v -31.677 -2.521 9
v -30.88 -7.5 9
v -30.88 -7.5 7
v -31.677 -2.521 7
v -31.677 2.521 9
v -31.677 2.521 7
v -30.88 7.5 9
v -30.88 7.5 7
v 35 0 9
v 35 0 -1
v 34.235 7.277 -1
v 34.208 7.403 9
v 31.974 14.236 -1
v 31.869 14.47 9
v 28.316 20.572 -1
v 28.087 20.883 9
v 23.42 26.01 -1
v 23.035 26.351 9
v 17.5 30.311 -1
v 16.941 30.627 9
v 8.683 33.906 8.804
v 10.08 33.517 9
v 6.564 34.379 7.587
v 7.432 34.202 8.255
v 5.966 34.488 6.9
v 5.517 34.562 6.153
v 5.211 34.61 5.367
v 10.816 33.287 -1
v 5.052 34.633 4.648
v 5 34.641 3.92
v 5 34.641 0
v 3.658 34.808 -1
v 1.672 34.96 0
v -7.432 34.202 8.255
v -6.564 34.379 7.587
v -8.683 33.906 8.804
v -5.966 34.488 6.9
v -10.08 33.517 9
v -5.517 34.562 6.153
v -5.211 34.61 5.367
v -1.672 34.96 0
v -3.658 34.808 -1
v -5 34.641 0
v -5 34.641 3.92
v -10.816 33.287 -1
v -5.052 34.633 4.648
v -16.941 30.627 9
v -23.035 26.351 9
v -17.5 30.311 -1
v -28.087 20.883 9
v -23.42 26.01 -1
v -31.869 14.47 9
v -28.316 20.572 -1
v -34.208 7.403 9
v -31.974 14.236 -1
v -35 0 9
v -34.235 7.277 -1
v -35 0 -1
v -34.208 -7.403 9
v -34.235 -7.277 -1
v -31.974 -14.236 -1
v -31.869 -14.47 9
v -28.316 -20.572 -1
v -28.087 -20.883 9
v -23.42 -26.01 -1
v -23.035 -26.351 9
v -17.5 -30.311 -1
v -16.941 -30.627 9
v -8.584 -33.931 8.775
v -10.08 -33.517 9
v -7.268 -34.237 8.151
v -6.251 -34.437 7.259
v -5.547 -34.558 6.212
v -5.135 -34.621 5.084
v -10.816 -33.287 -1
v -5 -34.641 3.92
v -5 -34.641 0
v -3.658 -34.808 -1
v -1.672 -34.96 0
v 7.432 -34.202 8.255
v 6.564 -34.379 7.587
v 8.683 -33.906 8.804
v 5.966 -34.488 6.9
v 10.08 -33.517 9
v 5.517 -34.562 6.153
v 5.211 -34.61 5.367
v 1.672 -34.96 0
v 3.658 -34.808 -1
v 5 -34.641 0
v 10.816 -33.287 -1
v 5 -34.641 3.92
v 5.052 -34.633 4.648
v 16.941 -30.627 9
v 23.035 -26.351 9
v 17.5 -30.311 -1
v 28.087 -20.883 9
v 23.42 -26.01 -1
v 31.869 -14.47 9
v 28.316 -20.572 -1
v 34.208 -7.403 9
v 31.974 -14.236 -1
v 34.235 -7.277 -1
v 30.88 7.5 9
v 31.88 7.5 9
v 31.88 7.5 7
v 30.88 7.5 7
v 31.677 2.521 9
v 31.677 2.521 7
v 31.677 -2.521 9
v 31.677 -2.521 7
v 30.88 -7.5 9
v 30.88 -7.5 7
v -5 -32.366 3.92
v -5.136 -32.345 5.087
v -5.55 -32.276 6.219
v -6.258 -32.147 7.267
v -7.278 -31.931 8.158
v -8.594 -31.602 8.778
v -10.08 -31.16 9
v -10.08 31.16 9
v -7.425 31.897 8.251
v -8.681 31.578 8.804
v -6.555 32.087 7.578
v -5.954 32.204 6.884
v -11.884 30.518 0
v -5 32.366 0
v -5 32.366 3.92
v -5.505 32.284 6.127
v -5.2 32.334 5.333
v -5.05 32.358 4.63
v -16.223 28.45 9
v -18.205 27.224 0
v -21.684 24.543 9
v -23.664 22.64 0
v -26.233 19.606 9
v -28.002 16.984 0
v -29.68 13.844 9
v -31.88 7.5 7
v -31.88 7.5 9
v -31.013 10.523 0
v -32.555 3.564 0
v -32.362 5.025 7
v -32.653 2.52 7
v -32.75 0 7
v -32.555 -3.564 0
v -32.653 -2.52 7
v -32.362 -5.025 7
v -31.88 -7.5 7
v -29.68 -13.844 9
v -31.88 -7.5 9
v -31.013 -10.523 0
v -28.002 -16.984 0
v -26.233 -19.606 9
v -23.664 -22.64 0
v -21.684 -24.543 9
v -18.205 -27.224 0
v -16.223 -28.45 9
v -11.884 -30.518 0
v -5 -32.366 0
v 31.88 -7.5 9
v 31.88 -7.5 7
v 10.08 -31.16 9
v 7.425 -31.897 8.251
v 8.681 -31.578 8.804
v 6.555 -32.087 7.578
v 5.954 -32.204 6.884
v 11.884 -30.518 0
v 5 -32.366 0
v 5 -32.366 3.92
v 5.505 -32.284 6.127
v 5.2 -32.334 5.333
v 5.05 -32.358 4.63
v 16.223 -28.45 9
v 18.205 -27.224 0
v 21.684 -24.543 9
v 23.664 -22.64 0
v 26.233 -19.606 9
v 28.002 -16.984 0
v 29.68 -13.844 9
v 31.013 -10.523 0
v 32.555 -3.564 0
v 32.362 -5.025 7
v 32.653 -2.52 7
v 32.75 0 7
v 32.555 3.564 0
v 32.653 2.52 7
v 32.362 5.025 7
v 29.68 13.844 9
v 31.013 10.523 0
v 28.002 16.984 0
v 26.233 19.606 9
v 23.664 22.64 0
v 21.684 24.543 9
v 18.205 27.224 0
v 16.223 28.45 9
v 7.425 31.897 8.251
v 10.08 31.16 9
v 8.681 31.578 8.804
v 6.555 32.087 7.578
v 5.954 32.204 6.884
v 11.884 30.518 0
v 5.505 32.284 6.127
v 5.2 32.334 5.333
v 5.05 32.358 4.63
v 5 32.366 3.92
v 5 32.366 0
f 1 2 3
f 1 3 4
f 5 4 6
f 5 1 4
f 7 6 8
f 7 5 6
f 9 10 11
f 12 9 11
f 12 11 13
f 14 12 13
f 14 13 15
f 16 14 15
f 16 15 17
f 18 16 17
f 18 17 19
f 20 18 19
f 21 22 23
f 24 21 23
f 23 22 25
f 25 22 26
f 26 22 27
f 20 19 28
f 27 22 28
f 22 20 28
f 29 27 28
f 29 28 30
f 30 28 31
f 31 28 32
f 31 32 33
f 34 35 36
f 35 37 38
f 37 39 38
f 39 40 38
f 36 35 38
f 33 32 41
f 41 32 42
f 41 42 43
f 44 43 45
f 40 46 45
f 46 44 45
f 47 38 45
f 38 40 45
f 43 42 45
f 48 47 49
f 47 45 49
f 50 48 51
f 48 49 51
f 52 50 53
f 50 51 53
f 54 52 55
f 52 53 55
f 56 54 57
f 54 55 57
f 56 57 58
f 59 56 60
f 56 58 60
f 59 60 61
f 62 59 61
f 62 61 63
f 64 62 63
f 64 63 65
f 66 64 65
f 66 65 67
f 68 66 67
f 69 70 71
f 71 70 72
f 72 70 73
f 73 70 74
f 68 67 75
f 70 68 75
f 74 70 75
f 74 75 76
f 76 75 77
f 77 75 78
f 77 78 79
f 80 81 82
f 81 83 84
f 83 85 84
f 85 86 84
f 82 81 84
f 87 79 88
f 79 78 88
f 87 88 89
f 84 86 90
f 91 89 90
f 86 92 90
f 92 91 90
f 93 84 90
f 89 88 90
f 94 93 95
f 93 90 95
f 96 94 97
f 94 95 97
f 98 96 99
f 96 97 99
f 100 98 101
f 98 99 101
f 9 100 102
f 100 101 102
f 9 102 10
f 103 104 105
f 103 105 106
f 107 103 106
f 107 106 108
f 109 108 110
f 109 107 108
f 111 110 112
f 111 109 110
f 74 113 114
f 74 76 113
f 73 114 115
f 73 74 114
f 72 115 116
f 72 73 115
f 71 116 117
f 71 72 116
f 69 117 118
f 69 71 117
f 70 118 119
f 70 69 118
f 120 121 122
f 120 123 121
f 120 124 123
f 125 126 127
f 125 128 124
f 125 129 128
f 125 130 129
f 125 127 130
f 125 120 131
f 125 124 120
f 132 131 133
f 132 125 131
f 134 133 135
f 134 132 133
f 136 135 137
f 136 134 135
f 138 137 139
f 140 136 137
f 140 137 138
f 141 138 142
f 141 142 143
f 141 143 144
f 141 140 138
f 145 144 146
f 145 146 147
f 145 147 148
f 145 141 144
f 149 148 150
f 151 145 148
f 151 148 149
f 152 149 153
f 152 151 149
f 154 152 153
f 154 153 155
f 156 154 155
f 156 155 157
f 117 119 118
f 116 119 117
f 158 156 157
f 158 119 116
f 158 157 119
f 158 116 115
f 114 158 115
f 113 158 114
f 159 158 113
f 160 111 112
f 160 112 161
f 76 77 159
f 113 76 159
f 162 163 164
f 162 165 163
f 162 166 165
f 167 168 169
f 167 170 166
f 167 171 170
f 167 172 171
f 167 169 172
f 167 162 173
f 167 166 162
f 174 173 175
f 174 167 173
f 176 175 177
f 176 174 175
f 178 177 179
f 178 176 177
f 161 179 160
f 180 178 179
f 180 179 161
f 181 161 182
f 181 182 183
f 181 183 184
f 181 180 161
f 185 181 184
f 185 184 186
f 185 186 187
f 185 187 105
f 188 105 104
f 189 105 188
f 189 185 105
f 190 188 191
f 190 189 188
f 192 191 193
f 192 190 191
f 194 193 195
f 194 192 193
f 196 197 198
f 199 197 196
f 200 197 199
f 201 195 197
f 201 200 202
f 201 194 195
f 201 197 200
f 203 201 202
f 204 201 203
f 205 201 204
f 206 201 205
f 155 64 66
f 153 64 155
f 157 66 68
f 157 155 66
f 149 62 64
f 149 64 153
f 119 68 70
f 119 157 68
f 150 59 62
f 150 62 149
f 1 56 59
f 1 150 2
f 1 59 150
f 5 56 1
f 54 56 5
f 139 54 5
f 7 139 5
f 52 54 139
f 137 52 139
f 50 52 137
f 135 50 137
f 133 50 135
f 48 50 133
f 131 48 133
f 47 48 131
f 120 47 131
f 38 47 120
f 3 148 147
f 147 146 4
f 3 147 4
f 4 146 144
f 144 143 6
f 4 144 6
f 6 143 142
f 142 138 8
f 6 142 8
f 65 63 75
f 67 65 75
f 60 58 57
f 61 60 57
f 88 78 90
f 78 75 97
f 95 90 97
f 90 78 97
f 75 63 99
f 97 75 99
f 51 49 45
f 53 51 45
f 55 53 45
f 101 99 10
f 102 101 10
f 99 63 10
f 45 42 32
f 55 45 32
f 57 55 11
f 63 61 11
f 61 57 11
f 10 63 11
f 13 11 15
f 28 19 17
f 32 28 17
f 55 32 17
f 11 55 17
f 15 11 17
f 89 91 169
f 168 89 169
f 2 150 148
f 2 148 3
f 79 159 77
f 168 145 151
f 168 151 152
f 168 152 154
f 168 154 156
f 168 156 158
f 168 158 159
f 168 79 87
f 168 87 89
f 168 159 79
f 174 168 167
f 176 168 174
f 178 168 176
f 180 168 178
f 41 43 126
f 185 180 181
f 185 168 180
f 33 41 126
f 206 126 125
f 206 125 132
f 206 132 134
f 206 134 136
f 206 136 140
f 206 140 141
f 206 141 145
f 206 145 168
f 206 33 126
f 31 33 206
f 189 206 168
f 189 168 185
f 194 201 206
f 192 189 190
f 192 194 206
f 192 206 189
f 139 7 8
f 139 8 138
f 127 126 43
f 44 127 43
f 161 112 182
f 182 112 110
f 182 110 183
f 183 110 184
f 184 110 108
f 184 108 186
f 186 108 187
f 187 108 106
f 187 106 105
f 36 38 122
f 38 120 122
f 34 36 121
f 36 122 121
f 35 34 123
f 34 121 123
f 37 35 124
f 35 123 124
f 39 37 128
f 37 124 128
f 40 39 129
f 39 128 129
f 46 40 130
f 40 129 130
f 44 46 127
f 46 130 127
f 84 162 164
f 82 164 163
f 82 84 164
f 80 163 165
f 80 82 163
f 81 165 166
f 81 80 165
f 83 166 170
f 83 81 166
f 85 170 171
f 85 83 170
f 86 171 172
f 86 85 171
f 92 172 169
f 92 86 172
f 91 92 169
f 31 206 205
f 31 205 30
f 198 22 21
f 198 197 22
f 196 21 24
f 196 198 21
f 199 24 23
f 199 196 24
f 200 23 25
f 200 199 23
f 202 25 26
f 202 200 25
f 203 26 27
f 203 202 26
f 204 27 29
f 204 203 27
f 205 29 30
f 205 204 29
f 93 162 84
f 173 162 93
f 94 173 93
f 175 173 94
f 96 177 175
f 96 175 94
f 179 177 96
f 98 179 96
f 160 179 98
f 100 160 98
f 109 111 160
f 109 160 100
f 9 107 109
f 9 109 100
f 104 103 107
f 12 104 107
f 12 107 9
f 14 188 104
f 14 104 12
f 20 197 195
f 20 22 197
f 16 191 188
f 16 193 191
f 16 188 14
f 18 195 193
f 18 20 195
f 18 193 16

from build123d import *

# Parameters (mm, degrees)
F0_R     = 35
F1_DEPTH = 1
F2_R     = 35
F2_R_2   = 32.75
F3_DEPTH = 9
F5_DEPTH = 2
F6_W     = 10
F6_H     = 76.2
F7_DEPTH = 25.4
F8_R     = 5.08


with BuildPart() as f1:
    # F0 (on Top) → F1 (new body)
    with BuildSketch(Plane.XY):
        Circle(F0_R)
    extrude(amount=-F1_DEPTH)

    # F2 (on Top) → F3 (join)
    with BuildSketch(Plane.XY):
        Circle(F2_R)
        Circle(F2_R_2, mode=Mode.SUBTRACT)
    extrude(amount=F3_DEPTH)

    # F4 (on face) → F5 (join)
    with BuildSketch(Plane.XY.offset(9)):
        with BuildLine():
            ThreePointArc((-31.8796565226, 7.5), (-32.531686485, 3.7751654854), (-32.75, 0))
            ThreePointArc((-32.75, 0), (-32.531686485, -3.7751654854), (-31.8796565226, -7.5))
            Line((-31.8796565226, -7.5), (-30.8796565226, -7.5))
            ThreePointArc((-30.8796565226, -7.5), (-31.7774005695, 0), (-30.8796565226, 7.5))
            Line((-30.8796565226, 7.5), (-31.8796565226, 7.5))
        make_face()
        with BuildLine():
            Line((30.8796565226, -7.5), (31.8796565226, -7.5))
            ThreePointArc((31.8796565226, -7.5), (32.531686485, -3.7751654854), (32.75, 0))
            ThreePointArc((32.75, 0), (32.531686485, 3.7751654854), (31.8796565226, 7.5))
            Line((31.8796565226, 7.5), (30.8796565226, 7.5))
            ThreePointArc((30.8796565226, 7.5), (31.7774005695, 0), (30.8796565226, -7.5))
        make_face()
    extrude(amount=-F5_DEPTH)

    # F6 (on Top) → F7 (cut)
    with BuildSketch(Plane.XY):
        Rectangle(F6_W, F6_H)
    extrude(amount=F7_DEPTH, mode=Mode.SUBTRACT)

    # F8
    f8_edges = [f1.edges().sort_by_distance(p)[0] for p in [
        (-5, 33.503543, 9),
        (-5, -33.503543, 9),
        (5, -33.503543, 9),
        (5, 33.503543, 9),
    ]]
    fillet(f8_edges, radius=F8_R)


solid = f1.part
